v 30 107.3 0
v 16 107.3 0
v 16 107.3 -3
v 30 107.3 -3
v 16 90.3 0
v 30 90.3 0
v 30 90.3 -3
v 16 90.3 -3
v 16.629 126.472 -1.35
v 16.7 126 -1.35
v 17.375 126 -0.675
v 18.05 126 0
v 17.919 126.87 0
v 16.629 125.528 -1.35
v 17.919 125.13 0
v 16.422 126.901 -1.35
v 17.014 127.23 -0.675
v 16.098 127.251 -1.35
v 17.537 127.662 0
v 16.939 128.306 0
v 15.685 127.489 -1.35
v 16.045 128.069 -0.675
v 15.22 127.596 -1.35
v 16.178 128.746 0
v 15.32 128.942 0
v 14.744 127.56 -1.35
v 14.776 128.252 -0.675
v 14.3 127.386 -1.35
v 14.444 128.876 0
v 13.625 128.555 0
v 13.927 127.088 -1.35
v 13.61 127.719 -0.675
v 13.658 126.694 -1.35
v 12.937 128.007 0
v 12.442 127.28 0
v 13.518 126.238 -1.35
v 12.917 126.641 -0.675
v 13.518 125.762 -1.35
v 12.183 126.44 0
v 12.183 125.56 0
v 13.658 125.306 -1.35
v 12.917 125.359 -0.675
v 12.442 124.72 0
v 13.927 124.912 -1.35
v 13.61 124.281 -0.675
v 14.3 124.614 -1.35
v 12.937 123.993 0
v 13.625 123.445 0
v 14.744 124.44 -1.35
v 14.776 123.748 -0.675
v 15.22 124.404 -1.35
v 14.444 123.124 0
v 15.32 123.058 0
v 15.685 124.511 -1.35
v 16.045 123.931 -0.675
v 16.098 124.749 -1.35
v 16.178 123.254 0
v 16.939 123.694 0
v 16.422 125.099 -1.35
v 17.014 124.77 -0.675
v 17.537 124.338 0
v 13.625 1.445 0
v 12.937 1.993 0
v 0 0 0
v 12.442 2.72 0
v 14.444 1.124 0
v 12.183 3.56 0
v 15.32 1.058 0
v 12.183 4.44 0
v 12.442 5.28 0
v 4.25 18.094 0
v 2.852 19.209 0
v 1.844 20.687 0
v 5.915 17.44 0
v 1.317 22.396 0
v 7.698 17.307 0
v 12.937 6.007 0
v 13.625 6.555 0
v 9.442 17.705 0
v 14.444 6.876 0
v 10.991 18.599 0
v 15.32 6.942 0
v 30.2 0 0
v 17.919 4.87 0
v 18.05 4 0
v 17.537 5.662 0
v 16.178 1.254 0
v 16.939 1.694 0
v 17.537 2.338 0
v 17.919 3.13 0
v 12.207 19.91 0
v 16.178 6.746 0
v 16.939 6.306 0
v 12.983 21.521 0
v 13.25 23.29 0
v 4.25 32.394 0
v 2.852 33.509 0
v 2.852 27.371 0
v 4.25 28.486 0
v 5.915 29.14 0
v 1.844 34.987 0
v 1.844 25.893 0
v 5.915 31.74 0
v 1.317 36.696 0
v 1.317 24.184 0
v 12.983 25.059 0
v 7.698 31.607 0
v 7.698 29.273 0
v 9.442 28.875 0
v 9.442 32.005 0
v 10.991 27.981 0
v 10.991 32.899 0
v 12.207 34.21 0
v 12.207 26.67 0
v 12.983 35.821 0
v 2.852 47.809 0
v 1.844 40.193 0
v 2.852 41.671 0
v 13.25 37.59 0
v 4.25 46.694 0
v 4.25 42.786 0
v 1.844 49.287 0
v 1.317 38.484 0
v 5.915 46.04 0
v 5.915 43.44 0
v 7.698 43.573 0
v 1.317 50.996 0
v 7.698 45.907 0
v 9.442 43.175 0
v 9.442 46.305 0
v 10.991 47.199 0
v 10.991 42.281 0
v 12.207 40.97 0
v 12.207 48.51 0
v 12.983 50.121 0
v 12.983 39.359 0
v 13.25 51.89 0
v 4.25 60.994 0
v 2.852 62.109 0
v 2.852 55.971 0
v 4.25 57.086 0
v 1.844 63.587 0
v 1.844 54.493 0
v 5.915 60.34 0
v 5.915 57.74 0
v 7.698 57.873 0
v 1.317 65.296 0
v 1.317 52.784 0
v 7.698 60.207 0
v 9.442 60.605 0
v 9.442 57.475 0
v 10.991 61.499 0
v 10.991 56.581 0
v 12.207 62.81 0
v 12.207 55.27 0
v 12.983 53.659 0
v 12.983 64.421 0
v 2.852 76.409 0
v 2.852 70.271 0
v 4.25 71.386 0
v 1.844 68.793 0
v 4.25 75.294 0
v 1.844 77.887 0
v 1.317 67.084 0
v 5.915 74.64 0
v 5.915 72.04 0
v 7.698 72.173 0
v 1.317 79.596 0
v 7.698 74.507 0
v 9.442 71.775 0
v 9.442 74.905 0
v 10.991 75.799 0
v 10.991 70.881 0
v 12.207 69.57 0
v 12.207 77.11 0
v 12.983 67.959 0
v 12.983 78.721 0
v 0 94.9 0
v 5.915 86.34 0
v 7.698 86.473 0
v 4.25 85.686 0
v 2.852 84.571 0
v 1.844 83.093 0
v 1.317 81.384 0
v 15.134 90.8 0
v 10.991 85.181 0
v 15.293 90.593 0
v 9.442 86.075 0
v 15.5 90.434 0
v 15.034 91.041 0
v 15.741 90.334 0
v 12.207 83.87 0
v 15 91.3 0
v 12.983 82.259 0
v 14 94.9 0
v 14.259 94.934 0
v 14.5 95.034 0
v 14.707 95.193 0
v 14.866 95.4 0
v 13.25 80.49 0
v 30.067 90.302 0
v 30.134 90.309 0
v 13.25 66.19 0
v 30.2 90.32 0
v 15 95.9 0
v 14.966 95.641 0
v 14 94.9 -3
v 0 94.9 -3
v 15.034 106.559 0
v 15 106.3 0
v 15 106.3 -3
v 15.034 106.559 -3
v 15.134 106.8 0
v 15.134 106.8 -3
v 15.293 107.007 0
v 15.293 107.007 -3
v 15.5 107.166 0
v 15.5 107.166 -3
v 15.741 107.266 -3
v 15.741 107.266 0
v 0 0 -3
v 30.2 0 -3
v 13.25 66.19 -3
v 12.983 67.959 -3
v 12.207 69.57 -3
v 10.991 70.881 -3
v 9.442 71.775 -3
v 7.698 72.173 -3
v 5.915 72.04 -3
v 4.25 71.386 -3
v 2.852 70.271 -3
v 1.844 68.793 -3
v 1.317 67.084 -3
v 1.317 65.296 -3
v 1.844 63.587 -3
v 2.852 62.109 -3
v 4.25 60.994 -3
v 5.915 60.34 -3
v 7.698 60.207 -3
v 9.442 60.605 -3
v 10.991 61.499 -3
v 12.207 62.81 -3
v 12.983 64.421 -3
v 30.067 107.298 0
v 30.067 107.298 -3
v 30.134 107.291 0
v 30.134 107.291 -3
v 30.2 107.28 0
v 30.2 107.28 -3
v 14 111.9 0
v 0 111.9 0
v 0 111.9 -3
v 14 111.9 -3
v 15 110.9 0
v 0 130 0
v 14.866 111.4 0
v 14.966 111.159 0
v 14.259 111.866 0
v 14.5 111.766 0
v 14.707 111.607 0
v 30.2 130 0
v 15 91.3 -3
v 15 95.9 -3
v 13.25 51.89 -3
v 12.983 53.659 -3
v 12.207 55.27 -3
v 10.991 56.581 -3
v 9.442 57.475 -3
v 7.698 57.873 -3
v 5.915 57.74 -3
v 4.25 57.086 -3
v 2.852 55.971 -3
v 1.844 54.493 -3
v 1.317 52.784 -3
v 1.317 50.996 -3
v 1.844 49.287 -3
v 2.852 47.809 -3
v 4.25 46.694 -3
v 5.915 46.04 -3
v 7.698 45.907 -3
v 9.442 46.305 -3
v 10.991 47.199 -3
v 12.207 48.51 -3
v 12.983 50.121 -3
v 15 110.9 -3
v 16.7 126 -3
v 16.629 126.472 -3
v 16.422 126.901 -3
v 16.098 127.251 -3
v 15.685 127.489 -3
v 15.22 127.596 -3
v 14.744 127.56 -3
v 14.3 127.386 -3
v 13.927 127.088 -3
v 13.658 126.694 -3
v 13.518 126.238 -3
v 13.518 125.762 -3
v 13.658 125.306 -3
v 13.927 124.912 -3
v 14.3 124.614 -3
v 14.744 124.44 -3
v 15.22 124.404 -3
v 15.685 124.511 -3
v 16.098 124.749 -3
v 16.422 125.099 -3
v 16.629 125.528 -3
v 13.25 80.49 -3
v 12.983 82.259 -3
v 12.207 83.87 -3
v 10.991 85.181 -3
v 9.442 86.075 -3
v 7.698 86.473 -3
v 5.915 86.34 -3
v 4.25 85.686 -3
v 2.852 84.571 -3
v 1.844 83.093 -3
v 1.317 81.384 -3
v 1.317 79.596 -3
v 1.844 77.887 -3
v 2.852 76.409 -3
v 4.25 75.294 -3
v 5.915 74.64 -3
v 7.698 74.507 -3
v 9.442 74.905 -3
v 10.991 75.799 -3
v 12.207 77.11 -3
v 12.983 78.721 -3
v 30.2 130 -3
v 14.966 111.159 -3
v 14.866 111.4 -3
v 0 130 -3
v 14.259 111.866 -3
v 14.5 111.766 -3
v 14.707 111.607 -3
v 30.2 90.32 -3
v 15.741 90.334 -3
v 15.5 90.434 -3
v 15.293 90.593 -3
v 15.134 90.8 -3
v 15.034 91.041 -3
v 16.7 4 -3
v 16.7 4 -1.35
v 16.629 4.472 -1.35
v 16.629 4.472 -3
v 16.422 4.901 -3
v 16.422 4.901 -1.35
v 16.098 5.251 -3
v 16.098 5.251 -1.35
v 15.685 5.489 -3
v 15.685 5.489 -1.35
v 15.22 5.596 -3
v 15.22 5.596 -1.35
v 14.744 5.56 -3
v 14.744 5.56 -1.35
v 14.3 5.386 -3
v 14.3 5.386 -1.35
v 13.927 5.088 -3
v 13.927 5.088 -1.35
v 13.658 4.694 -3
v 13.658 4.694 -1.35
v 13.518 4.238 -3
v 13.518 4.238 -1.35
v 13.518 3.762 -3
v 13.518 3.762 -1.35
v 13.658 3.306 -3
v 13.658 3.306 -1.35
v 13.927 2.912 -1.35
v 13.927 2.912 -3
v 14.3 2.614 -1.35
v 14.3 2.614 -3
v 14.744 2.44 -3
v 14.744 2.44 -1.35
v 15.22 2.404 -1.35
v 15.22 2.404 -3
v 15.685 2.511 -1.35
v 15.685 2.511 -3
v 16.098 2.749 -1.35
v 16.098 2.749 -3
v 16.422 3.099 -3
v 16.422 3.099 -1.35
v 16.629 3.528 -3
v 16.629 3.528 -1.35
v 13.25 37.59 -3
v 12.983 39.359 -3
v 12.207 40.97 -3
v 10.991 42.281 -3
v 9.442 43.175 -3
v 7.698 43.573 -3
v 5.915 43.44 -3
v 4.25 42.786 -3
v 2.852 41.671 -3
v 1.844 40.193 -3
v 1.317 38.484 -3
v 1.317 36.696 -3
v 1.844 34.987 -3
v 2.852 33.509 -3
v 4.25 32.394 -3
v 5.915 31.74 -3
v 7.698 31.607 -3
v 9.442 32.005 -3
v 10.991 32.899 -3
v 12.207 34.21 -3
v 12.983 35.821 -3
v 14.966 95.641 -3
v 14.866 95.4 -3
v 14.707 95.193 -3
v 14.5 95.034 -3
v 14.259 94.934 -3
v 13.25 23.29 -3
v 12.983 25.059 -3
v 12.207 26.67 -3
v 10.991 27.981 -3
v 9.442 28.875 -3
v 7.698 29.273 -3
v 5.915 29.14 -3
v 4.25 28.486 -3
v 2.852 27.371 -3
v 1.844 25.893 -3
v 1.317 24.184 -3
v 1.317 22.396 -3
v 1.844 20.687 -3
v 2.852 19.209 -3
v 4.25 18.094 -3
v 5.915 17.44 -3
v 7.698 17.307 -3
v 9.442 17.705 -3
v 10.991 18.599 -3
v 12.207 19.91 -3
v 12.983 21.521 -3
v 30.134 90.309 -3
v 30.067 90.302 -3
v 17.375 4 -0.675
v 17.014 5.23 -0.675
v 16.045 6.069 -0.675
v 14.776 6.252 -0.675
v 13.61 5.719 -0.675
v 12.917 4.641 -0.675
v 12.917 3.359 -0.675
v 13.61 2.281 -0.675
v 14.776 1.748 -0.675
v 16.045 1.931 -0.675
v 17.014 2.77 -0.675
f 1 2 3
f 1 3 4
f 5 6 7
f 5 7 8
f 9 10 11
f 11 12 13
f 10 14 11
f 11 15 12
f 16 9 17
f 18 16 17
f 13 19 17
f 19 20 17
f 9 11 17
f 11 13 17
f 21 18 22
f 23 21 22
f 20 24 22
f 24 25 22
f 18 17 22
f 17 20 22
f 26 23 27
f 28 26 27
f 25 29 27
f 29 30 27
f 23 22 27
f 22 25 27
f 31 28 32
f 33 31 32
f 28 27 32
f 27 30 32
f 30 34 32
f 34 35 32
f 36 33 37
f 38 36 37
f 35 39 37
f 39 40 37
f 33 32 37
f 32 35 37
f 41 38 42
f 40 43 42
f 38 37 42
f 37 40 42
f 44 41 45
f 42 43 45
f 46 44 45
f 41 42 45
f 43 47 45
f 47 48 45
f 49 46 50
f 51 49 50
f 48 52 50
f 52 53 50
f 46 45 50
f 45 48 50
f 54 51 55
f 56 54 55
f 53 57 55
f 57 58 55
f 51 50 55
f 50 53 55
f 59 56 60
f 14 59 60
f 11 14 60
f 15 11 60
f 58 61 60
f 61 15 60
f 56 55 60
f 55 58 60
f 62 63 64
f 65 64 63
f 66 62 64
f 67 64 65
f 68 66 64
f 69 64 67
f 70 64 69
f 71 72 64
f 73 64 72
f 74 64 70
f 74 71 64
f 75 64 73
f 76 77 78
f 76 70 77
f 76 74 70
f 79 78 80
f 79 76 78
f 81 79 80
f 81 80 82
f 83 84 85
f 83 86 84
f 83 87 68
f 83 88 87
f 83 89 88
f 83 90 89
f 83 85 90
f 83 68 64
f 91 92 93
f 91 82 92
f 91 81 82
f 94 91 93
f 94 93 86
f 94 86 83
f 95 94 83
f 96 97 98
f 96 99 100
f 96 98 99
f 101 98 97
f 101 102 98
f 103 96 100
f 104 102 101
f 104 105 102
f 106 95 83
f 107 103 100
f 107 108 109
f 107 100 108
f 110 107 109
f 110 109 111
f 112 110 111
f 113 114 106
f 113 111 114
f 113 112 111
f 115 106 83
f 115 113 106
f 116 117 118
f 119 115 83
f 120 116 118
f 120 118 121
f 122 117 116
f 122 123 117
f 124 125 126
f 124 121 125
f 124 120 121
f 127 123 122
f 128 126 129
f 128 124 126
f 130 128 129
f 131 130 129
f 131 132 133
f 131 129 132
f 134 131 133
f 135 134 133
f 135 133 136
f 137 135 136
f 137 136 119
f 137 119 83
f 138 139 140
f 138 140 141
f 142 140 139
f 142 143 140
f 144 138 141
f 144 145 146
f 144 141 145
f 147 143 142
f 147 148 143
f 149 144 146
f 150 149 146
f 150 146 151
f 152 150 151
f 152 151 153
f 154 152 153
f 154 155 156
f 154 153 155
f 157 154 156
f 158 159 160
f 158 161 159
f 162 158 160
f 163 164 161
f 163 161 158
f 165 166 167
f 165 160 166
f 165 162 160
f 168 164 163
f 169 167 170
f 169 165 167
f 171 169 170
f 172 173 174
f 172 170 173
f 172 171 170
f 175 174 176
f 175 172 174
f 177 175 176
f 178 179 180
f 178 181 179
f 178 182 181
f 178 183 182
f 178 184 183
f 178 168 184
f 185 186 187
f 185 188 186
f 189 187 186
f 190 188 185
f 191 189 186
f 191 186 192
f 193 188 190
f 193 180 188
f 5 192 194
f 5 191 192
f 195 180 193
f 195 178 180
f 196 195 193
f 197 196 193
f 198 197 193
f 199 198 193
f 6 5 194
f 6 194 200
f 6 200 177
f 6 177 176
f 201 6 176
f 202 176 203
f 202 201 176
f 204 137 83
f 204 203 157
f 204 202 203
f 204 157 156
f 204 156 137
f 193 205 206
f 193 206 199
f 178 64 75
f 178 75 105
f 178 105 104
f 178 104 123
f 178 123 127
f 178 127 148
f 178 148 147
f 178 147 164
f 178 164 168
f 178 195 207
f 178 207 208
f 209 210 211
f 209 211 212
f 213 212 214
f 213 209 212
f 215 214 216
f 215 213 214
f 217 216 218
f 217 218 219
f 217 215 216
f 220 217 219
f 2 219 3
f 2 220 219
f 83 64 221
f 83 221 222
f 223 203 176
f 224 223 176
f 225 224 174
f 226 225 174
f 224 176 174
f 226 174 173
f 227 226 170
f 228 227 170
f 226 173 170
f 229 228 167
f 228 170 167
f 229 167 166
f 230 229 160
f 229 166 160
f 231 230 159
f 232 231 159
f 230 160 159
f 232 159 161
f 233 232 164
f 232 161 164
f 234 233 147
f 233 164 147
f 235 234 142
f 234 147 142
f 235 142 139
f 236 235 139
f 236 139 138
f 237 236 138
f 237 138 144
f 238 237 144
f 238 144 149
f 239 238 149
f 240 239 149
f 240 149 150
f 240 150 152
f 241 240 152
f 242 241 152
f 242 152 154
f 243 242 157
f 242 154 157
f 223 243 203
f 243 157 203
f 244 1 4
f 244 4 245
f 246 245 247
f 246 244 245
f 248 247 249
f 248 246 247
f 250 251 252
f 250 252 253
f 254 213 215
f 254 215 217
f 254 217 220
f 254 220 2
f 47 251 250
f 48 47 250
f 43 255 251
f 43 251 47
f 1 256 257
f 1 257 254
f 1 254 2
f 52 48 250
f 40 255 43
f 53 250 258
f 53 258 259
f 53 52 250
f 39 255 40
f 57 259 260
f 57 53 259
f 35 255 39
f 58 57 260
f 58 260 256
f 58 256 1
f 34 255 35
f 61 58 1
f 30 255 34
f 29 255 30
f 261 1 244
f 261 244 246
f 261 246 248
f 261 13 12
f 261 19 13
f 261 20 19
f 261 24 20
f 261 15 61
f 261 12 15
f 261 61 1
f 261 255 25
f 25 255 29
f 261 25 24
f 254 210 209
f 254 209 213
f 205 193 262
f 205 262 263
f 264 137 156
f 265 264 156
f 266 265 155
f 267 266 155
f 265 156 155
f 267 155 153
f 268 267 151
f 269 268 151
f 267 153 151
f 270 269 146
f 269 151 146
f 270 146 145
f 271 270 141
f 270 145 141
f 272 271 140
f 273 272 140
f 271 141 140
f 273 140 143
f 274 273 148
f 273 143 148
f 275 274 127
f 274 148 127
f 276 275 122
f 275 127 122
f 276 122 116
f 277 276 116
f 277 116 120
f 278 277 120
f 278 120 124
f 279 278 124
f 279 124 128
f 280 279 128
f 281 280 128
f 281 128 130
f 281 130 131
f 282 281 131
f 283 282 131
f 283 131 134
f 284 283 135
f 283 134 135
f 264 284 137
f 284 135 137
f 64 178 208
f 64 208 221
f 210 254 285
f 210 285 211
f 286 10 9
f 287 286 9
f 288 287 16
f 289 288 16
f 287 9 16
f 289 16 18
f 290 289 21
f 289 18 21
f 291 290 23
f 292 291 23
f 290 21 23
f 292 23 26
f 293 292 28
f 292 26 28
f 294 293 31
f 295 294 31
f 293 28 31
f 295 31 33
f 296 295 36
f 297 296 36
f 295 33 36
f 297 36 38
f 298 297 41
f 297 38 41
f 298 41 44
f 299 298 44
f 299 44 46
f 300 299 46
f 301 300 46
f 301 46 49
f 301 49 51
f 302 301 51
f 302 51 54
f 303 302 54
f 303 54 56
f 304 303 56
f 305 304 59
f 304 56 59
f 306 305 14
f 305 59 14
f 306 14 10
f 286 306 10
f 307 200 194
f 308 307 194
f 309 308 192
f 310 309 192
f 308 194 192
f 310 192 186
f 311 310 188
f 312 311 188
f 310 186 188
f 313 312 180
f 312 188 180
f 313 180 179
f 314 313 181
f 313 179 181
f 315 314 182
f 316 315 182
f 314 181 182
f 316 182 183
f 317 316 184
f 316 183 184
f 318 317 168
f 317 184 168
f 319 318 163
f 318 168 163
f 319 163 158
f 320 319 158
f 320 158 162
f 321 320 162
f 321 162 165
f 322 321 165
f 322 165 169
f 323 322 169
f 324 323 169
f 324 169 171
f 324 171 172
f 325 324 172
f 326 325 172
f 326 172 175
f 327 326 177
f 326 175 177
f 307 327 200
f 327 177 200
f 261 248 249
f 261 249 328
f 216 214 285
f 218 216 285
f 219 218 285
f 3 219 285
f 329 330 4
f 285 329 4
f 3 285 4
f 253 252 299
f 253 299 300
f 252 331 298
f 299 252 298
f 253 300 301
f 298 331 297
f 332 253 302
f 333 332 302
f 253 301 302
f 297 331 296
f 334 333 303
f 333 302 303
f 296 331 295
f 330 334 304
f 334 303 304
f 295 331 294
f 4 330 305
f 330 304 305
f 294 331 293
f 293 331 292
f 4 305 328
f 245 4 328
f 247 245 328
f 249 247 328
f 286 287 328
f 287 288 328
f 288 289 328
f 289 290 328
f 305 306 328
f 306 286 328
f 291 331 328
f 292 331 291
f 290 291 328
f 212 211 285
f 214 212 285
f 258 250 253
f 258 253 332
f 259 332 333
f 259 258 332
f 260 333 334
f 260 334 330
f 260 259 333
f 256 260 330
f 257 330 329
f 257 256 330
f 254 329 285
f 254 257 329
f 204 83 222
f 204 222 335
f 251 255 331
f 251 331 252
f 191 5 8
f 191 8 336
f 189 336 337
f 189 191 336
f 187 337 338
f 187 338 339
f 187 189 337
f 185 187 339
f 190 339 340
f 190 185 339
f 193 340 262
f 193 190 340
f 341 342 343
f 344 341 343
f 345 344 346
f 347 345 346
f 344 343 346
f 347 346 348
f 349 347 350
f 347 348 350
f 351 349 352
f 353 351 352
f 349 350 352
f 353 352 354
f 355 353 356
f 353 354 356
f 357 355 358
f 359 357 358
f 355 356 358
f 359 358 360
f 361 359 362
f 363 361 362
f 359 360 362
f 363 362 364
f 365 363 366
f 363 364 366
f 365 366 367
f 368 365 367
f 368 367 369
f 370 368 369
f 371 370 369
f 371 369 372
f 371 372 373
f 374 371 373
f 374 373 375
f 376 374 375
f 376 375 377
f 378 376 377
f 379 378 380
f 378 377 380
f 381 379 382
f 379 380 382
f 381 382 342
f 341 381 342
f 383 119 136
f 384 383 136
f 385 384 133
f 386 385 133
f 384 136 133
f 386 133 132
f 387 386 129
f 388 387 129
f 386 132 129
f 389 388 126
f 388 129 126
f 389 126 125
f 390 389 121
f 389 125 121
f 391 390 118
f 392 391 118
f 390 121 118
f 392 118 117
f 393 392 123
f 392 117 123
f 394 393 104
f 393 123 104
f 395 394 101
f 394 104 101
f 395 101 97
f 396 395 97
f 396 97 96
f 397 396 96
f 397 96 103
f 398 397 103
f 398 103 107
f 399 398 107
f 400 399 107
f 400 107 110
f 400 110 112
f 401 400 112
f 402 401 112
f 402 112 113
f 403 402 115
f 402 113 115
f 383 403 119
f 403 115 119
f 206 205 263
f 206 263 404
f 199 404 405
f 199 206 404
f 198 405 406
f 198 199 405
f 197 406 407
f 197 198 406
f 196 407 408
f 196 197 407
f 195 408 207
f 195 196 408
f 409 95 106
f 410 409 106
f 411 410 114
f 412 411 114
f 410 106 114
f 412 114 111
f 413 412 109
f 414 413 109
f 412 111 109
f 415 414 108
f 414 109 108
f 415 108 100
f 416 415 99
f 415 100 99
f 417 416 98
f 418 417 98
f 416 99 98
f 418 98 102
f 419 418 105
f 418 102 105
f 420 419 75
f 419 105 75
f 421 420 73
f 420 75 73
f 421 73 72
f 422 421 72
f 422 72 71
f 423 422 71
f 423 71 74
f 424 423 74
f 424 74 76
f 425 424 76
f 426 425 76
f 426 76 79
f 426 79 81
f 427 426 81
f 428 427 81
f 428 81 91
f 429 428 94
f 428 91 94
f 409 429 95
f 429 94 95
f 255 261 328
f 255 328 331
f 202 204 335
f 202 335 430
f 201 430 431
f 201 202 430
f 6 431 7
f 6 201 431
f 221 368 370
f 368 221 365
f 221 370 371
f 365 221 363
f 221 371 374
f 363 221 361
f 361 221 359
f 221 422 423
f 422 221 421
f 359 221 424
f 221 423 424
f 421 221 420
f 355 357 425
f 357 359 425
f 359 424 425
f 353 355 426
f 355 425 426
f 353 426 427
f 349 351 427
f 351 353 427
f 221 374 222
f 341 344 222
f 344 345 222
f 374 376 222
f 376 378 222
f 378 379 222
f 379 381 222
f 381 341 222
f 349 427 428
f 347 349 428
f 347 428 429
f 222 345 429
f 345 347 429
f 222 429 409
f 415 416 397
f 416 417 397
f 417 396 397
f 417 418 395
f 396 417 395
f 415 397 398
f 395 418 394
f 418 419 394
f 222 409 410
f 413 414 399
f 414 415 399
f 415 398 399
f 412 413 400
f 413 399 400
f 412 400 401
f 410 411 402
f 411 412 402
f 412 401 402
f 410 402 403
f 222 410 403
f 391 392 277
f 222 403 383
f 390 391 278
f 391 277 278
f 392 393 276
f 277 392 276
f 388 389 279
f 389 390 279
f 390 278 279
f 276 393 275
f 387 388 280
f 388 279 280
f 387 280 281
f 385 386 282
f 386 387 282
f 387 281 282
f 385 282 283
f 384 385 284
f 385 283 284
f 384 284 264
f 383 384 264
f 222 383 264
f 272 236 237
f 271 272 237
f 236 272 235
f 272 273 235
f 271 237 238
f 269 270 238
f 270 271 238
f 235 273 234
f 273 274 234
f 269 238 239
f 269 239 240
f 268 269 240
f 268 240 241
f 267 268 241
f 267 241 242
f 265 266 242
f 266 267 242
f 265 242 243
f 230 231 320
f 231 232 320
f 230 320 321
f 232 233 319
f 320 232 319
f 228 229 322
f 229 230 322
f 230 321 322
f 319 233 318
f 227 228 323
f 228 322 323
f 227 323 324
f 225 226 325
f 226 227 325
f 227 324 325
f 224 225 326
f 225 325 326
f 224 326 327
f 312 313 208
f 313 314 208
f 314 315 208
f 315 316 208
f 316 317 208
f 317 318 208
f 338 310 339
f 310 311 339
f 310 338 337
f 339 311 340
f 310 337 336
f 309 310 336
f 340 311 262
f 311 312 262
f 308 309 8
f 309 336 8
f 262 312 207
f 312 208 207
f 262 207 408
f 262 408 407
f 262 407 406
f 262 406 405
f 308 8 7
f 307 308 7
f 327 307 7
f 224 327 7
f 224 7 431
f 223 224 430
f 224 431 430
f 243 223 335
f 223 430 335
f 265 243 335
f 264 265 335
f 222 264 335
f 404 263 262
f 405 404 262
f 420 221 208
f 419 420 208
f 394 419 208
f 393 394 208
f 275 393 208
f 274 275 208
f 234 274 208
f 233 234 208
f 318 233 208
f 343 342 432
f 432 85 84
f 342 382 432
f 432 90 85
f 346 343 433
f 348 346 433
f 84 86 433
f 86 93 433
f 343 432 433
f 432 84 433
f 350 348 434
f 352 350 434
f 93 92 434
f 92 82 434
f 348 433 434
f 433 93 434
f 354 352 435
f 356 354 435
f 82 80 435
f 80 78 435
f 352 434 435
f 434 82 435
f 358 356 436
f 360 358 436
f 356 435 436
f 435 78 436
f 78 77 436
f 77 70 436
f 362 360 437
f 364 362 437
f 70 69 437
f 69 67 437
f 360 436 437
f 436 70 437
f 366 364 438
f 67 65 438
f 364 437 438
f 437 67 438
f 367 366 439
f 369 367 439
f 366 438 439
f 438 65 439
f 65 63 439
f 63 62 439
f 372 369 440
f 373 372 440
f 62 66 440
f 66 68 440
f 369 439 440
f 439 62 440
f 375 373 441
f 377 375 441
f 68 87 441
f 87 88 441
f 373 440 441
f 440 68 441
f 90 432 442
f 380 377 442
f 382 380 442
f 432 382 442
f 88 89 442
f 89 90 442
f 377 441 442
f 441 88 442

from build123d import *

# Parameters (mm, degrees)
MODEL_R                           = 1.6
AUFSATZ_LINEAR_AUSTRAGEN1_DEPTH   = 3
MODEL_R_2                         = 6
AUFSATZ_LINEAR_AUSTRAGEN1_2_DEPTH = 3
FASE1_SIZE                        = 1.35
FASE2_SIZE                        = 1.35


with BuildPart() as part:
    # Model → Aufsatz-Linear austragen1 (new body)
    with BuildSketch(Plane.XY):
        with BuildLine():
            Line((30.2, 107.279795897), (30.2, 130))
            Line((30.2, 130), (0, 130))
            Line((0, 130), (0, 111.9))
            Line((0, 111.9), (14, 111.9))
            ThreePointArc((14, 111.9), (14.707106781, 111.607106781), (15, 110.9))
            Line((15, 110.9), (15, 106.3))
            ThreePointArc((15, 106.3), (15.292893219, 107.007106781), (16, 107.3))
            Line((16, 107.3), (30, 107.3))
            ThreePointArc((30, 107.3), (30.100508962, 107.294936153), (30.2, 107.279795897))
        make_face()
        with Locations((15.1, 126)):
            Circle(MODEL_R, mode=Mode.SUBTRACT)
    extrude(amount=-AUFSATZ_LINEAR_AUSTRAGEN1_DEPTH)

    # Fase2
    fase2_edges = [part.edges().sort_by_distance(p)[0] for p in [
        (13.5, 126, 0),
    ]]
    chamfer(fase2_edges, length=FASE2_SIZE)


with BuildPart() as body_2:
    # Model → Aufsatz-Linear austragen1 2 (new body)
    with BuildSketch(Plane.XY):
        with BuildLine():
            Line((30.2, 0), (30.2, 90.320204103))
            ThreePointArc((30.2, 90.320204103), (30.100508962, 90.305063847), (30, 90.3))
            Line((30, 90.3), (16, 90.3))
            ThreePointArc((16, 90.3), (15.292893219, 90.592893219), (15, 91.3))
            Line((15, 91.3), (15, 95.9))
            ThreePointArc((15, 95.9), (14.707106781, 95.192893219), (14, 94.9))
            Line((14, 94.9), (0, 94.9))
            Line((0, 94.9), (0, 0))
            Line((0, 0), (30.2, 0))
        make_face()
        with Locations((7.25, 23.29)):
            Circle(MODEL_R_2, mode=Mode.SUBTRACT)
        with Locations((7.25, 37.59)):
            Circle(MODEL_R_2, mode=Mode.SUBTRACT)
        with Locations((7.25, 51.89)):
            Circle(MODEL_R_2, mode=Mode.SUBTRACT)
        with Locations((7.25, 66.19)):
            Circle(MODEL_R_2, mode=Mode.SUBTRACT)
        with Locations((7.25, 80.49)):
            Circle(MODEL_R_2, mode=Mode.SUBTRACT)
        with Locations((15.1, 4)):
            Circle(MODEL_R, mode=Mode.SUBTRACT)
    extrude(amount=-AUFSATZ_LINEAR_AUSTRAGEN1_2_DEPTH)

    # Fase1
    fase1_edges = [body_2.edges().sort_by_distance(p)[0] for p in [
        (13.5, 4, 0),
    ]]
    chamfer(fase1_edges, length=FASE1_SIZE)


solid = Compound([part.part, body_2.part])
